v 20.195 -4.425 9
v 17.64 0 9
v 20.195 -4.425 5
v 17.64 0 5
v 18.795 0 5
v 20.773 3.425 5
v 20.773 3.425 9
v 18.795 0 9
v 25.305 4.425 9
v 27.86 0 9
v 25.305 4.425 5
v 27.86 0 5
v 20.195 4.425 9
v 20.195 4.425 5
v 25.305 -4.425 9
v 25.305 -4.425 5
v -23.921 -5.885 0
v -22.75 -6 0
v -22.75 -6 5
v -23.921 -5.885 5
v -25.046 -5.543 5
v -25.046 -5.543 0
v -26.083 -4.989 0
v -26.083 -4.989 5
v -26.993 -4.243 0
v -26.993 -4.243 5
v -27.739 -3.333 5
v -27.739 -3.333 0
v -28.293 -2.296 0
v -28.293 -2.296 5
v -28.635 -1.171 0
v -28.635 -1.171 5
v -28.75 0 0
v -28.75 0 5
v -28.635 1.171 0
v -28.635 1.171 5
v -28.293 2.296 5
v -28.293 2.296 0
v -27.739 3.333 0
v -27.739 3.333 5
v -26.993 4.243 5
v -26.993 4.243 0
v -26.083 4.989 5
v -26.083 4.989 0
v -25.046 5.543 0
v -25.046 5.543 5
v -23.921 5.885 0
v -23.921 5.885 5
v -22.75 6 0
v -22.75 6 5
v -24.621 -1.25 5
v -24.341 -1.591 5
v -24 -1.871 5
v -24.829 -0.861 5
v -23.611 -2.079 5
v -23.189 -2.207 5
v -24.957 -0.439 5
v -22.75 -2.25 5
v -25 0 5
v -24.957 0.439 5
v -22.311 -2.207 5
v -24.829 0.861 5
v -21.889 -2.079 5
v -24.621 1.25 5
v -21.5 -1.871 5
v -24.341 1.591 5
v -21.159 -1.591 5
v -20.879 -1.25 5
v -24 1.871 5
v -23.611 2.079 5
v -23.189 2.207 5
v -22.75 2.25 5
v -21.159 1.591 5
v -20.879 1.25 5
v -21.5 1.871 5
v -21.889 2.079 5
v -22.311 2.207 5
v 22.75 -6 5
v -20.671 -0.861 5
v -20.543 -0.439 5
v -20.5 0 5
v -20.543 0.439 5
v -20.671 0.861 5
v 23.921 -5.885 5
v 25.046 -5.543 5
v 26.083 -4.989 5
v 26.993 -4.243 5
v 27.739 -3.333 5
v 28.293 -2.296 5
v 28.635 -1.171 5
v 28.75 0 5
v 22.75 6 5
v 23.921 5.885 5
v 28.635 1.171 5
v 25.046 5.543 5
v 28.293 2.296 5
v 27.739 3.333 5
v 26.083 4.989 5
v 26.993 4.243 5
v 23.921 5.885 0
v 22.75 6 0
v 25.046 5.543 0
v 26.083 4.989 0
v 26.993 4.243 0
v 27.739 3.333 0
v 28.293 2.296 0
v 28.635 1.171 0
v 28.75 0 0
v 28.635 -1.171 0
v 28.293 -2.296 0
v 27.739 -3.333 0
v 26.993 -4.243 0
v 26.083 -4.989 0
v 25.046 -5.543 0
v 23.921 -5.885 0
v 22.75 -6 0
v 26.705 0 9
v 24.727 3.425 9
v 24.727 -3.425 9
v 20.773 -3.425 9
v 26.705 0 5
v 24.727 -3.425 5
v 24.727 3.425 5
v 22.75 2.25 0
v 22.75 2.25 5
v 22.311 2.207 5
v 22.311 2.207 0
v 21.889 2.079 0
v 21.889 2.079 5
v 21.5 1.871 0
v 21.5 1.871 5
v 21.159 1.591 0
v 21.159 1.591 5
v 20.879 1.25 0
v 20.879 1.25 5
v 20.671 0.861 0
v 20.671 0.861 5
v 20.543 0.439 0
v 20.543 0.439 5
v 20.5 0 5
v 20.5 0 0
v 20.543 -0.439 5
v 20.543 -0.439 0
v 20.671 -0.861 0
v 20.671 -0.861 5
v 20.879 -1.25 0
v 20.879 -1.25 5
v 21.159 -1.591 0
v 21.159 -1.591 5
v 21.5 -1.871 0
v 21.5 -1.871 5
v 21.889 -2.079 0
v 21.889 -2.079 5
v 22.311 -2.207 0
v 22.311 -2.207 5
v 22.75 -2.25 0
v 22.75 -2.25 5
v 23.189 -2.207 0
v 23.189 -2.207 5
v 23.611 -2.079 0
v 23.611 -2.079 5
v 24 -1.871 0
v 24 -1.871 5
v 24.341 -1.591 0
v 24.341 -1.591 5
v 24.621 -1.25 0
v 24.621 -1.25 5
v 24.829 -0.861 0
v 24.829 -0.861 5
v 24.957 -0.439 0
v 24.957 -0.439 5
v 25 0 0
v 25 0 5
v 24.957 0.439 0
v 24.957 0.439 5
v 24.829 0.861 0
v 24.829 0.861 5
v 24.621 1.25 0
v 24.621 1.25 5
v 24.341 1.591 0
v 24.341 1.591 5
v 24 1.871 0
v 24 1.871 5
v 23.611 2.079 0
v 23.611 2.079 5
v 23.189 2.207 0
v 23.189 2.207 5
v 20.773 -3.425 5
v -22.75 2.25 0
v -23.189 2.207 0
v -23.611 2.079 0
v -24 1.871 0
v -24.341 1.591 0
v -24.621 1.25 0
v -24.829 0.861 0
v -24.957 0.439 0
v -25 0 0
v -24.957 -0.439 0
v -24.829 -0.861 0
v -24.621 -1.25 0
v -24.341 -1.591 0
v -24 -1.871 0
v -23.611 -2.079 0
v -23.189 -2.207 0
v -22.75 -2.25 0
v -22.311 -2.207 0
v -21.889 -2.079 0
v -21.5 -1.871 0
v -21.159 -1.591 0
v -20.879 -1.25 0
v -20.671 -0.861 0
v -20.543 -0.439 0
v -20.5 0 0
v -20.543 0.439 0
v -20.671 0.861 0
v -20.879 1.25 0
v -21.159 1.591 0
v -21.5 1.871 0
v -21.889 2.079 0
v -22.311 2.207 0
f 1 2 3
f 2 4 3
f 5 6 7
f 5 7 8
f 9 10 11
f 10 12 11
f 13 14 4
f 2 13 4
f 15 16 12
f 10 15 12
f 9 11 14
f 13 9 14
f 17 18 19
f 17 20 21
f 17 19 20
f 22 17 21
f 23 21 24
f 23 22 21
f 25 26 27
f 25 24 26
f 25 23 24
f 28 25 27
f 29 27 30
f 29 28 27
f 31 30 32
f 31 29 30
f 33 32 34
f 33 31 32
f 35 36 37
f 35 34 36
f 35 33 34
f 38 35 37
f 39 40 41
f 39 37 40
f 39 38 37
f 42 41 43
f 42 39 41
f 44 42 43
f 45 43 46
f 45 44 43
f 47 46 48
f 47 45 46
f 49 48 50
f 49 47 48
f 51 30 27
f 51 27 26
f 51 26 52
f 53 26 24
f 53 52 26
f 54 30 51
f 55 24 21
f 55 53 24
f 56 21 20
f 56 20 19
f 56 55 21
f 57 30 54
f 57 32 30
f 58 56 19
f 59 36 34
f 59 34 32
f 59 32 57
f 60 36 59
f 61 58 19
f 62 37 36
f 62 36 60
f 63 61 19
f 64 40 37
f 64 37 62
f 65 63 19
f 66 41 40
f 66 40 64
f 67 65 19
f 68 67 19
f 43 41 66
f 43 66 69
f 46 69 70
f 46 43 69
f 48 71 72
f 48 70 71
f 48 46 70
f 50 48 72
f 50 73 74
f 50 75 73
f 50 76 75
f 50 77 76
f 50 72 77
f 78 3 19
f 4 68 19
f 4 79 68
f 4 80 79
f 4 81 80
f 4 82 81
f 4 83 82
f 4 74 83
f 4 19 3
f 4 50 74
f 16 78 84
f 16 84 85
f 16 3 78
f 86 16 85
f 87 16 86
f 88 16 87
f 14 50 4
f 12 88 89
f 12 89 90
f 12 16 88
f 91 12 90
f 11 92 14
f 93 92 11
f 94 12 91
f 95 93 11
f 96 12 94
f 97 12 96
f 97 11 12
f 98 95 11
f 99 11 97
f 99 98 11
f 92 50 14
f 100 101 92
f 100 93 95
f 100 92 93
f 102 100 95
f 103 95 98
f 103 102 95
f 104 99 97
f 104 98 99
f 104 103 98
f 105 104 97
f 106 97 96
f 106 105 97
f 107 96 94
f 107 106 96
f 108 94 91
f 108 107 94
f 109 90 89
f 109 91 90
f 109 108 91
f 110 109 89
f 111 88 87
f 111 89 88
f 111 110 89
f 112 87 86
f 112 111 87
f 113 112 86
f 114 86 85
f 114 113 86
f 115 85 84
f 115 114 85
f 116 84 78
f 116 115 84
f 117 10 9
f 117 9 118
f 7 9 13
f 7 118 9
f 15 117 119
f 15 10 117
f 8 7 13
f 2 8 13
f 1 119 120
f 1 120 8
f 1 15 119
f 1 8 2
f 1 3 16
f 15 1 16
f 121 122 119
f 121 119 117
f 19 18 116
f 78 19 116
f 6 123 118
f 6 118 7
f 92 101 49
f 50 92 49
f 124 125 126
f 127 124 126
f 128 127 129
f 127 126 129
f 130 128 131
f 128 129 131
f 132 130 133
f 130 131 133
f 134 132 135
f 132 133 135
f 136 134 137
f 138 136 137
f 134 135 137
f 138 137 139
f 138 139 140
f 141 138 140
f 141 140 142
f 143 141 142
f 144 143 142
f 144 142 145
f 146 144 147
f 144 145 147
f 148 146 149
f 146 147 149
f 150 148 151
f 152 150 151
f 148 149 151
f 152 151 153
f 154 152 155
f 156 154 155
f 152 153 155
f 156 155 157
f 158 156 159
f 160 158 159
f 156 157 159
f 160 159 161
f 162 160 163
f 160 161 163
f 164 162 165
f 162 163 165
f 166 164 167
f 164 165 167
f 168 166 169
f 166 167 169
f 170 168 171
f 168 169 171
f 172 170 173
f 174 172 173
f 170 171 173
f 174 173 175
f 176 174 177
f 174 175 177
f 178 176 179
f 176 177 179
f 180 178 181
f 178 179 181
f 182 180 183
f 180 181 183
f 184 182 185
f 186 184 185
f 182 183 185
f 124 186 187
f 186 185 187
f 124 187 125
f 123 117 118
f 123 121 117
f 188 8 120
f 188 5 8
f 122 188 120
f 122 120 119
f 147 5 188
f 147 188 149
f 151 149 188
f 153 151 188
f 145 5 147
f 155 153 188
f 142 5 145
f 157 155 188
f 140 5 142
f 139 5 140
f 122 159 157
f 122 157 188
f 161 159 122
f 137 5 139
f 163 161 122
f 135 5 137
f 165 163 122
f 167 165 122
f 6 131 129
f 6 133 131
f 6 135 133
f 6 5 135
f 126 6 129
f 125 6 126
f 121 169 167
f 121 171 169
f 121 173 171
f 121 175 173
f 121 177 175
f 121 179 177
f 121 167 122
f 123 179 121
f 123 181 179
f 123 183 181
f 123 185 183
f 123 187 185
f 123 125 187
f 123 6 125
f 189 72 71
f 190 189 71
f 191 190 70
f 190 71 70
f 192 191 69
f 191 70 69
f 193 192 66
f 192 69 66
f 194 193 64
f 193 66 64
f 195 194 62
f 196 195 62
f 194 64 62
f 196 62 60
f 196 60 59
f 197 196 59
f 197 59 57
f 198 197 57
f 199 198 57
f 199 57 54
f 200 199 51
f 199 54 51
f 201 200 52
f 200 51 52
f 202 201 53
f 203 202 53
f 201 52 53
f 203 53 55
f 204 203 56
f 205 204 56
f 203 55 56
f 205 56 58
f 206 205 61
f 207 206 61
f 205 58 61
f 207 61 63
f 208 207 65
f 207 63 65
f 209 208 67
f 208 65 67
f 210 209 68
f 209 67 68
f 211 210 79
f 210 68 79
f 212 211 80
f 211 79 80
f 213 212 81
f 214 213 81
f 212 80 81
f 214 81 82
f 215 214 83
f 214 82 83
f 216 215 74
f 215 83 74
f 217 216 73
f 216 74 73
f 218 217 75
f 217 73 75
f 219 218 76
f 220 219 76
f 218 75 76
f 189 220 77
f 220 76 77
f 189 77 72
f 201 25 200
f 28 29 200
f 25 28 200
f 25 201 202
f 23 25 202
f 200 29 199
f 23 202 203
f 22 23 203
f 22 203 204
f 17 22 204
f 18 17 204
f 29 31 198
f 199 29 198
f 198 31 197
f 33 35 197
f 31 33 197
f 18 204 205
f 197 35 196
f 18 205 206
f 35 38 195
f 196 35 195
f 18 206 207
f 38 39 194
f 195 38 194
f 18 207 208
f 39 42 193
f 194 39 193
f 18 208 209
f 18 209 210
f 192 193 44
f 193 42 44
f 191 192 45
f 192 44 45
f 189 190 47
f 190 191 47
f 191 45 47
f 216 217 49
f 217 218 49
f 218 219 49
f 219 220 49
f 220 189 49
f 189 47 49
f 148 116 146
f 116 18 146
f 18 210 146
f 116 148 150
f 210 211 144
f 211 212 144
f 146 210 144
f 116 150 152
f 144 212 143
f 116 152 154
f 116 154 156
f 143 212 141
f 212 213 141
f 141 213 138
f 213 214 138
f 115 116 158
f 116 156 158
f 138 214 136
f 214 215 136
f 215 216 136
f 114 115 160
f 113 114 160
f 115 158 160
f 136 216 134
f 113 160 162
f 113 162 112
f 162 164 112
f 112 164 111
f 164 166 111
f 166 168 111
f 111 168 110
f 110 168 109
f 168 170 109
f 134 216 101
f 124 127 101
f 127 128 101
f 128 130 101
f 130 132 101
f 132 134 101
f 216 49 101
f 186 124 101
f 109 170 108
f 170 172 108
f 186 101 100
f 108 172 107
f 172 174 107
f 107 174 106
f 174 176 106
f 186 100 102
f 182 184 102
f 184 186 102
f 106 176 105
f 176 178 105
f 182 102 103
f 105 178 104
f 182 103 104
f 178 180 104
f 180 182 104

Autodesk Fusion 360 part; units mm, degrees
sketch "Sketch1" plane through (0, 0, 0) normal (0, 0, 1) x (1, 0, 0)
  line L0 (-22.75, -6) -> (22.75, -6)
  arc A0 (22.75, -6) -> (22.75, 6) centre (22.75, 0) ccw
  line L1 (22.75, 6) -> (-22.75, 6)
  arc A1 (-22.75, 6) -> (-22.75, -6) centre (-22.75, 0) ccw
  line L2 (-22.75, 0) -> (22.75, 0) construction
  dimension "d1" = 45.5
  dimension "d2" = 12
extrude "Extrude1" add sketch "Sketch1" along normal blind 5
hole "Hole1" at (22.75, 0, 0) at (-22.75, 0, 0) direction (0, 0, 1) diameter 4.5 depth 8 tip angle 118
sketch "Sketch4" plane through (0, 0, 5) normal (0, 0, 1) x (-1, 0, 0)
  circle A0 centre (-22.75, 0) radius 2.25
  circle A1 centre (22.75, 0) radius 2.25
  arc A2 (22.75, -6) -> (22.75, 6) centre (22.75, 0) ccw
  line L0 (22.75, 6) -> (-22.75, 6)
  arc A3 (-22.75, 6) -> (-22.75, -6) centre (-22.75, 0) ccw
  line L1 (-22.75, -6) -> (22.75, -6)
  line L2 (-26.7048, 0) -> (-24.7274, -3.425)
  line L3 (-24.7274, -3.425) -> (-20.7726, -3.425)
  line L4 (-20.7726, -3.425) -> (-18.7952, 0)
  line L5 (-18.7952, 0) -> (-20.7726, 3.425)
  line L6 (-20.7726, 3.425) -> (-24.7274, 3.425)
  line L7 (-24.7274, 3.425) -> (-26.7048, 0)
  line L8 (-20.1952, 4.425) -> (-25.3048, 4.425)
  line L9 (-25.3048, 4.425) -> (-27.8595, 0)
  line L10 (-27.8595, 0) -> (-25.3048, -4.425)
  line L11 (-25.3048, -4.425) -> (-20.1952, -4.425)
  line L12 (-20.1952, -4.425) -> (-17.6405, 0)
  line L13 (-17.6405, 0) -> (-20.1952, 4.425)
  point P0 (-22.75, 0)
  dimension "d8" = 6.85
  dimension "d9" = 1
extrude "Extrude2" add sketch "Sketch4" along normal blind 4 contours L8 L9 L10 L11 L12 L13
